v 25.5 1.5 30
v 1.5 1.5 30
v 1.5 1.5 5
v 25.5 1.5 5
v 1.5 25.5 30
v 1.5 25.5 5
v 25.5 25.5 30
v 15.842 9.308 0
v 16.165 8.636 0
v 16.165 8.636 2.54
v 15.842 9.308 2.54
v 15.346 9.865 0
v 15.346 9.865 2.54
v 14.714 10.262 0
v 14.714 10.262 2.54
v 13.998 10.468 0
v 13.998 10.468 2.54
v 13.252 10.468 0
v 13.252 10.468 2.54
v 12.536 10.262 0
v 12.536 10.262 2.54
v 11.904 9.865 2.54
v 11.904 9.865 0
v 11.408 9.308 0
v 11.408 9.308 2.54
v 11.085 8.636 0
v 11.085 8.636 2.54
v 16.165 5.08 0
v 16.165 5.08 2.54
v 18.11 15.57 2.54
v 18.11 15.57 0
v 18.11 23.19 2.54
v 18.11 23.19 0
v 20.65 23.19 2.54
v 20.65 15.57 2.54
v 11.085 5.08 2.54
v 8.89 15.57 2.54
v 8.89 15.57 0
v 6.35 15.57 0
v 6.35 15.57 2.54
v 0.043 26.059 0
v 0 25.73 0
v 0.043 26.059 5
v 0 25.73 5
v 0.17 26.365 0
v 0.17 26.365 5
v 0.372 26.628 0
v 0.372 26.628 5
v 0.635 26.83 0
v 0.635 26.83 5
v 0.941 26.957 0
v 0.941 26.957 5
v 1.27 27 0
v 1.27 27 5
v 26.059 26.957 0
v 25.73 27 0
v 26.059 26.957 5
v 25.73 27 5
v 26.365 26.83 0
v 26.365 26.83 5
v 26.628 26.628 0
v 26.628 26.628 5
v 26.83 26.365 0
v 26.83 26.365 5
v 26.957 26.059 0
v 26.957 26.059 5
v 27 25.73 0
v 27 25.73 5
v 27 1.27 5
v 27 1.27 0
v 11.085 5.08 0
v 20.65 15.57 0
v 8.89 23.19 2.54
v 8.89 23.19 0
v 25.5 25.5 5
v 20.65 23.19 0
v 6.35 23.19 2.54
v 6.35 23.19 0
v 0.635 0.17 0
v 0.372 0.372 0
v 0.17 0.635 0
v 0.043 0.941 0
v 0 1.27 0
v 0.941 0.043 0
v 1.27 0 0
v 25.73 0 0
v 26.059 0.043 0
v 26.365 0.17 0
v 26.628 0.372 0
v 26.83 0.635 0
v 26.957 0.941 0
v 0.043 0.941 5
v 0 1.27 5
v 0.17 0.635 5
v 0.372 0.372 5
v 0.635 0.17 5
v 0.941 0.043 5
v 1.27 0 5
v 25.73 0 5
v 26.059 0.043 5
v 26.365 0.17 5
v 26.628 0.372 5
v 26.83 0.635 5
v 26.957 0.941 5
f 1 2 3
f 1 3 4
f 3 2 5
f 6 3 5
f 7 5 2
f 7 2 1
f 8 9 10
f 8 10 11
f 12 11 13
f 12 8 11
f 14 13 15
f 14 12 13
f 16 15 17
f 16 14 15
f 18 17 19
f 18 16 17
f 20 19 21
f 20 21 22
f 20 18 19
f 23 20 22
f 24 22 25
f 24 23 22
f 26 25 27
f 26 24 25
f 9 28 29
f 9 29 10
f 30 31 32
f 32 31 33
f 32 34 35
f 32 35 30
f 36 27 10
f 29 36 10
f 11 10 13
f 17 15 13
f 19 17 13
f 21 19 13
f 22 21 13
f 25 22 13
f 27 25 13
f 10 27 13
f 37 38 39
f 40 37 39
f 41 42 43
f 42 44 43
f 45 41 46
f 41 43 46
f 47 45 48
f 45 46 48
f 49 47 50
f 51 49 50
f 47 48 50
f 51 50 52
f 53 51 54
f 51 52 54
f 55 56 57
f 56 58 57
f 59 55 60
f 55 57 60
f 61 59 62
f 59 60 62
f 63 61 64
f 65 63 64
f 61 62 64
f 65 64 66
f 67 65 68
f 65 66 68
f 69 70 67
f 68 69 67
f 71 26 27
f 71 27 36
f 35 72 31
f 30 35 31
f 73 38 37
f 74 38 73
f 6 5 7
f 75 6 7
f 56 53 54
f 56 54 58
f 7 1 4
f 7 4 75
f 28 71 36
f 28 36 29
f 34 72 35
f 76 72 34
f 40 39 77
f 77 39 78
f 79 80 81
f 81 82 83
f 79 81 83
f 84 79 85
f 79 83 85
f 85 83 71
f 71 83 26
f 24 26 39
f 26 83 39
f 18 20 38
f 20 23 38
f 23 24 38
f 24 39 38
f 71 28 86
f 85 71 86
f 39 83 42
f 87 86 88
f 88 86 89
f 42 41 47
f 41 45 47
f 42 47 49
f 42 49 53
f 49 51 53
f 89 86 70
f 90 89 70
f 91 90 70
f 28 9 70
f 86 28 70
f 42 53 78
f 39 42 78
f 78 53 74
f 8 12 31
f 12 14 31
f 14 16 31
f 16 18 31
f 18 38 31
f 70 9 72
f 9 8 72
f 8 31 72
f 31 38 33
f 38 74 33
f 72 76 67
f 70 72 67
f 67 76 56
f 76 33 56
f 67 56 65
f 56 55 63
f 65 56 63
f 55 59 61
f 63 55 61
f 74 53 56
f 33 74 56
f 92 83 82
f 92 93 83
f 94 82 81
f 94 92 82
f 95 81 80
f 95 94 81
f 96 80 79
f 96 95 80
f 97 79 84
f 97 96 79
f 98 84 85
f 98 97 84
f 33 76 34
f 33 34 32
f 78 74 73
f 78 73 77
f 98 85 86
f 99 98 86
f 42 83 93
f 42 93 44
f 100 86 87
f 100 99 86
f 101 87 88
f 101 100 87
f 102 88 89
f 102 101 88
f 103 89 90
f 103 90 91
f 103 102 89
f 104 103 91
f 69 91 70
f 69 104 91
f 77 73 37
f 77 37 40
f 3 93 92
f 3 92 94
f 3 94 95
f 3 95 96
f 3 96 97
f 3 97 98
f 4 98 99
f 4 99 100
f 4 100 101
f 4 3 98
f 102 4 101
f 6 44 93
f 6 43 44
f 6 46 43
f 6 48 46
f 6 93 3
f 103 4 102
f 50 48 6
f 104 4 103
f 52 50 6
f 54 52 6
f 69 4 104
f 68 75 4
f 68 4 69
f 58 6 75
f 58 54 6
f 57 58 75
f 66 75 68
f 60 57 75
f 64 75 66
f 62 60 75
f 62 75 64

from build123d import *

# Parameters (mm, degrees)
SKETCH1_W           = 27
SKETCH1_H           = 27
BOSS_EXTRUDE1_DEPTH = 5
SKETCH2_W           = 24
SKETCH2_H           = 24
BOSS_EXTRUDE2_DEPTH = 25
FILLET1_R           = 1.27
SKETCH3_W           = 2.54
SKETCH3_H           = 7.62
CUT_EXTRUDE1_DEPTH  = 2.54


with BuildPart() as part:
    # Sketch1 → Boss-Extrude1 (new body)
    with BuildSketch(Plane.XY):
        with Locations((13.5, 13.5)):
            Rectangle(SKETCH1_W, SKETCH1_H)
    extrude(amount=BOSS_EXTRUDE1_DEPTH)

    # Sketch2 → Boss-Extrude2 (add)
    with BuildSketch(Plane.XY.offset(5)):
        with Locations((13.5, 13.5)):
            Rectangle(SKETCH2_W, SKETCH2_H)
    extrude(amount=BOSS_EXTRUDE2_DEPTH)

    # Fillet1
    fillet1_edges = [part.edges().sort_by_distance(p)[0] for p in [
        (0, 27, 2.5),
        (27, 27, 2.5),
        (27, 0, 2.5),
        (0, 0, 2.5),
    ]]
    fillet(fillet1_edges, radius=FILLET1_R)

    # Sketch3 → Cut-Extrude1 (cut)
    with BuildSketch(Plane(origin=(0, 0, 0), x_dir=(-1, 0, 0), z_dir=(0, 0, -1))):
        with Locations((-19.38, 19.38)):
            Rectangle(SKETCH3_W, SKETCH3_H)
        with Locations((-7.62, 19.38)):
            Rectangle(SKETCH3_W, SKETCH3_H)
        with BuildLine():
            Line((-16.164953657, 5.08), (-16.164953657, 8.636))
            ThreePointArc((-16.164953657, 8.636), (-13.624953657, 10.494493494), (-11.084953657, 8.636))
            Line((-11.084953657, 8.636), (-11.084953657, 5.08))
            Line((-11.084953657, 5.08), (-16.164953657, 5.08))
        make_face()
    extrude(amount=-CUT_EXTRUDE1_DEPTH, mode=Mode.SUBTRACT)


solid = part.part
